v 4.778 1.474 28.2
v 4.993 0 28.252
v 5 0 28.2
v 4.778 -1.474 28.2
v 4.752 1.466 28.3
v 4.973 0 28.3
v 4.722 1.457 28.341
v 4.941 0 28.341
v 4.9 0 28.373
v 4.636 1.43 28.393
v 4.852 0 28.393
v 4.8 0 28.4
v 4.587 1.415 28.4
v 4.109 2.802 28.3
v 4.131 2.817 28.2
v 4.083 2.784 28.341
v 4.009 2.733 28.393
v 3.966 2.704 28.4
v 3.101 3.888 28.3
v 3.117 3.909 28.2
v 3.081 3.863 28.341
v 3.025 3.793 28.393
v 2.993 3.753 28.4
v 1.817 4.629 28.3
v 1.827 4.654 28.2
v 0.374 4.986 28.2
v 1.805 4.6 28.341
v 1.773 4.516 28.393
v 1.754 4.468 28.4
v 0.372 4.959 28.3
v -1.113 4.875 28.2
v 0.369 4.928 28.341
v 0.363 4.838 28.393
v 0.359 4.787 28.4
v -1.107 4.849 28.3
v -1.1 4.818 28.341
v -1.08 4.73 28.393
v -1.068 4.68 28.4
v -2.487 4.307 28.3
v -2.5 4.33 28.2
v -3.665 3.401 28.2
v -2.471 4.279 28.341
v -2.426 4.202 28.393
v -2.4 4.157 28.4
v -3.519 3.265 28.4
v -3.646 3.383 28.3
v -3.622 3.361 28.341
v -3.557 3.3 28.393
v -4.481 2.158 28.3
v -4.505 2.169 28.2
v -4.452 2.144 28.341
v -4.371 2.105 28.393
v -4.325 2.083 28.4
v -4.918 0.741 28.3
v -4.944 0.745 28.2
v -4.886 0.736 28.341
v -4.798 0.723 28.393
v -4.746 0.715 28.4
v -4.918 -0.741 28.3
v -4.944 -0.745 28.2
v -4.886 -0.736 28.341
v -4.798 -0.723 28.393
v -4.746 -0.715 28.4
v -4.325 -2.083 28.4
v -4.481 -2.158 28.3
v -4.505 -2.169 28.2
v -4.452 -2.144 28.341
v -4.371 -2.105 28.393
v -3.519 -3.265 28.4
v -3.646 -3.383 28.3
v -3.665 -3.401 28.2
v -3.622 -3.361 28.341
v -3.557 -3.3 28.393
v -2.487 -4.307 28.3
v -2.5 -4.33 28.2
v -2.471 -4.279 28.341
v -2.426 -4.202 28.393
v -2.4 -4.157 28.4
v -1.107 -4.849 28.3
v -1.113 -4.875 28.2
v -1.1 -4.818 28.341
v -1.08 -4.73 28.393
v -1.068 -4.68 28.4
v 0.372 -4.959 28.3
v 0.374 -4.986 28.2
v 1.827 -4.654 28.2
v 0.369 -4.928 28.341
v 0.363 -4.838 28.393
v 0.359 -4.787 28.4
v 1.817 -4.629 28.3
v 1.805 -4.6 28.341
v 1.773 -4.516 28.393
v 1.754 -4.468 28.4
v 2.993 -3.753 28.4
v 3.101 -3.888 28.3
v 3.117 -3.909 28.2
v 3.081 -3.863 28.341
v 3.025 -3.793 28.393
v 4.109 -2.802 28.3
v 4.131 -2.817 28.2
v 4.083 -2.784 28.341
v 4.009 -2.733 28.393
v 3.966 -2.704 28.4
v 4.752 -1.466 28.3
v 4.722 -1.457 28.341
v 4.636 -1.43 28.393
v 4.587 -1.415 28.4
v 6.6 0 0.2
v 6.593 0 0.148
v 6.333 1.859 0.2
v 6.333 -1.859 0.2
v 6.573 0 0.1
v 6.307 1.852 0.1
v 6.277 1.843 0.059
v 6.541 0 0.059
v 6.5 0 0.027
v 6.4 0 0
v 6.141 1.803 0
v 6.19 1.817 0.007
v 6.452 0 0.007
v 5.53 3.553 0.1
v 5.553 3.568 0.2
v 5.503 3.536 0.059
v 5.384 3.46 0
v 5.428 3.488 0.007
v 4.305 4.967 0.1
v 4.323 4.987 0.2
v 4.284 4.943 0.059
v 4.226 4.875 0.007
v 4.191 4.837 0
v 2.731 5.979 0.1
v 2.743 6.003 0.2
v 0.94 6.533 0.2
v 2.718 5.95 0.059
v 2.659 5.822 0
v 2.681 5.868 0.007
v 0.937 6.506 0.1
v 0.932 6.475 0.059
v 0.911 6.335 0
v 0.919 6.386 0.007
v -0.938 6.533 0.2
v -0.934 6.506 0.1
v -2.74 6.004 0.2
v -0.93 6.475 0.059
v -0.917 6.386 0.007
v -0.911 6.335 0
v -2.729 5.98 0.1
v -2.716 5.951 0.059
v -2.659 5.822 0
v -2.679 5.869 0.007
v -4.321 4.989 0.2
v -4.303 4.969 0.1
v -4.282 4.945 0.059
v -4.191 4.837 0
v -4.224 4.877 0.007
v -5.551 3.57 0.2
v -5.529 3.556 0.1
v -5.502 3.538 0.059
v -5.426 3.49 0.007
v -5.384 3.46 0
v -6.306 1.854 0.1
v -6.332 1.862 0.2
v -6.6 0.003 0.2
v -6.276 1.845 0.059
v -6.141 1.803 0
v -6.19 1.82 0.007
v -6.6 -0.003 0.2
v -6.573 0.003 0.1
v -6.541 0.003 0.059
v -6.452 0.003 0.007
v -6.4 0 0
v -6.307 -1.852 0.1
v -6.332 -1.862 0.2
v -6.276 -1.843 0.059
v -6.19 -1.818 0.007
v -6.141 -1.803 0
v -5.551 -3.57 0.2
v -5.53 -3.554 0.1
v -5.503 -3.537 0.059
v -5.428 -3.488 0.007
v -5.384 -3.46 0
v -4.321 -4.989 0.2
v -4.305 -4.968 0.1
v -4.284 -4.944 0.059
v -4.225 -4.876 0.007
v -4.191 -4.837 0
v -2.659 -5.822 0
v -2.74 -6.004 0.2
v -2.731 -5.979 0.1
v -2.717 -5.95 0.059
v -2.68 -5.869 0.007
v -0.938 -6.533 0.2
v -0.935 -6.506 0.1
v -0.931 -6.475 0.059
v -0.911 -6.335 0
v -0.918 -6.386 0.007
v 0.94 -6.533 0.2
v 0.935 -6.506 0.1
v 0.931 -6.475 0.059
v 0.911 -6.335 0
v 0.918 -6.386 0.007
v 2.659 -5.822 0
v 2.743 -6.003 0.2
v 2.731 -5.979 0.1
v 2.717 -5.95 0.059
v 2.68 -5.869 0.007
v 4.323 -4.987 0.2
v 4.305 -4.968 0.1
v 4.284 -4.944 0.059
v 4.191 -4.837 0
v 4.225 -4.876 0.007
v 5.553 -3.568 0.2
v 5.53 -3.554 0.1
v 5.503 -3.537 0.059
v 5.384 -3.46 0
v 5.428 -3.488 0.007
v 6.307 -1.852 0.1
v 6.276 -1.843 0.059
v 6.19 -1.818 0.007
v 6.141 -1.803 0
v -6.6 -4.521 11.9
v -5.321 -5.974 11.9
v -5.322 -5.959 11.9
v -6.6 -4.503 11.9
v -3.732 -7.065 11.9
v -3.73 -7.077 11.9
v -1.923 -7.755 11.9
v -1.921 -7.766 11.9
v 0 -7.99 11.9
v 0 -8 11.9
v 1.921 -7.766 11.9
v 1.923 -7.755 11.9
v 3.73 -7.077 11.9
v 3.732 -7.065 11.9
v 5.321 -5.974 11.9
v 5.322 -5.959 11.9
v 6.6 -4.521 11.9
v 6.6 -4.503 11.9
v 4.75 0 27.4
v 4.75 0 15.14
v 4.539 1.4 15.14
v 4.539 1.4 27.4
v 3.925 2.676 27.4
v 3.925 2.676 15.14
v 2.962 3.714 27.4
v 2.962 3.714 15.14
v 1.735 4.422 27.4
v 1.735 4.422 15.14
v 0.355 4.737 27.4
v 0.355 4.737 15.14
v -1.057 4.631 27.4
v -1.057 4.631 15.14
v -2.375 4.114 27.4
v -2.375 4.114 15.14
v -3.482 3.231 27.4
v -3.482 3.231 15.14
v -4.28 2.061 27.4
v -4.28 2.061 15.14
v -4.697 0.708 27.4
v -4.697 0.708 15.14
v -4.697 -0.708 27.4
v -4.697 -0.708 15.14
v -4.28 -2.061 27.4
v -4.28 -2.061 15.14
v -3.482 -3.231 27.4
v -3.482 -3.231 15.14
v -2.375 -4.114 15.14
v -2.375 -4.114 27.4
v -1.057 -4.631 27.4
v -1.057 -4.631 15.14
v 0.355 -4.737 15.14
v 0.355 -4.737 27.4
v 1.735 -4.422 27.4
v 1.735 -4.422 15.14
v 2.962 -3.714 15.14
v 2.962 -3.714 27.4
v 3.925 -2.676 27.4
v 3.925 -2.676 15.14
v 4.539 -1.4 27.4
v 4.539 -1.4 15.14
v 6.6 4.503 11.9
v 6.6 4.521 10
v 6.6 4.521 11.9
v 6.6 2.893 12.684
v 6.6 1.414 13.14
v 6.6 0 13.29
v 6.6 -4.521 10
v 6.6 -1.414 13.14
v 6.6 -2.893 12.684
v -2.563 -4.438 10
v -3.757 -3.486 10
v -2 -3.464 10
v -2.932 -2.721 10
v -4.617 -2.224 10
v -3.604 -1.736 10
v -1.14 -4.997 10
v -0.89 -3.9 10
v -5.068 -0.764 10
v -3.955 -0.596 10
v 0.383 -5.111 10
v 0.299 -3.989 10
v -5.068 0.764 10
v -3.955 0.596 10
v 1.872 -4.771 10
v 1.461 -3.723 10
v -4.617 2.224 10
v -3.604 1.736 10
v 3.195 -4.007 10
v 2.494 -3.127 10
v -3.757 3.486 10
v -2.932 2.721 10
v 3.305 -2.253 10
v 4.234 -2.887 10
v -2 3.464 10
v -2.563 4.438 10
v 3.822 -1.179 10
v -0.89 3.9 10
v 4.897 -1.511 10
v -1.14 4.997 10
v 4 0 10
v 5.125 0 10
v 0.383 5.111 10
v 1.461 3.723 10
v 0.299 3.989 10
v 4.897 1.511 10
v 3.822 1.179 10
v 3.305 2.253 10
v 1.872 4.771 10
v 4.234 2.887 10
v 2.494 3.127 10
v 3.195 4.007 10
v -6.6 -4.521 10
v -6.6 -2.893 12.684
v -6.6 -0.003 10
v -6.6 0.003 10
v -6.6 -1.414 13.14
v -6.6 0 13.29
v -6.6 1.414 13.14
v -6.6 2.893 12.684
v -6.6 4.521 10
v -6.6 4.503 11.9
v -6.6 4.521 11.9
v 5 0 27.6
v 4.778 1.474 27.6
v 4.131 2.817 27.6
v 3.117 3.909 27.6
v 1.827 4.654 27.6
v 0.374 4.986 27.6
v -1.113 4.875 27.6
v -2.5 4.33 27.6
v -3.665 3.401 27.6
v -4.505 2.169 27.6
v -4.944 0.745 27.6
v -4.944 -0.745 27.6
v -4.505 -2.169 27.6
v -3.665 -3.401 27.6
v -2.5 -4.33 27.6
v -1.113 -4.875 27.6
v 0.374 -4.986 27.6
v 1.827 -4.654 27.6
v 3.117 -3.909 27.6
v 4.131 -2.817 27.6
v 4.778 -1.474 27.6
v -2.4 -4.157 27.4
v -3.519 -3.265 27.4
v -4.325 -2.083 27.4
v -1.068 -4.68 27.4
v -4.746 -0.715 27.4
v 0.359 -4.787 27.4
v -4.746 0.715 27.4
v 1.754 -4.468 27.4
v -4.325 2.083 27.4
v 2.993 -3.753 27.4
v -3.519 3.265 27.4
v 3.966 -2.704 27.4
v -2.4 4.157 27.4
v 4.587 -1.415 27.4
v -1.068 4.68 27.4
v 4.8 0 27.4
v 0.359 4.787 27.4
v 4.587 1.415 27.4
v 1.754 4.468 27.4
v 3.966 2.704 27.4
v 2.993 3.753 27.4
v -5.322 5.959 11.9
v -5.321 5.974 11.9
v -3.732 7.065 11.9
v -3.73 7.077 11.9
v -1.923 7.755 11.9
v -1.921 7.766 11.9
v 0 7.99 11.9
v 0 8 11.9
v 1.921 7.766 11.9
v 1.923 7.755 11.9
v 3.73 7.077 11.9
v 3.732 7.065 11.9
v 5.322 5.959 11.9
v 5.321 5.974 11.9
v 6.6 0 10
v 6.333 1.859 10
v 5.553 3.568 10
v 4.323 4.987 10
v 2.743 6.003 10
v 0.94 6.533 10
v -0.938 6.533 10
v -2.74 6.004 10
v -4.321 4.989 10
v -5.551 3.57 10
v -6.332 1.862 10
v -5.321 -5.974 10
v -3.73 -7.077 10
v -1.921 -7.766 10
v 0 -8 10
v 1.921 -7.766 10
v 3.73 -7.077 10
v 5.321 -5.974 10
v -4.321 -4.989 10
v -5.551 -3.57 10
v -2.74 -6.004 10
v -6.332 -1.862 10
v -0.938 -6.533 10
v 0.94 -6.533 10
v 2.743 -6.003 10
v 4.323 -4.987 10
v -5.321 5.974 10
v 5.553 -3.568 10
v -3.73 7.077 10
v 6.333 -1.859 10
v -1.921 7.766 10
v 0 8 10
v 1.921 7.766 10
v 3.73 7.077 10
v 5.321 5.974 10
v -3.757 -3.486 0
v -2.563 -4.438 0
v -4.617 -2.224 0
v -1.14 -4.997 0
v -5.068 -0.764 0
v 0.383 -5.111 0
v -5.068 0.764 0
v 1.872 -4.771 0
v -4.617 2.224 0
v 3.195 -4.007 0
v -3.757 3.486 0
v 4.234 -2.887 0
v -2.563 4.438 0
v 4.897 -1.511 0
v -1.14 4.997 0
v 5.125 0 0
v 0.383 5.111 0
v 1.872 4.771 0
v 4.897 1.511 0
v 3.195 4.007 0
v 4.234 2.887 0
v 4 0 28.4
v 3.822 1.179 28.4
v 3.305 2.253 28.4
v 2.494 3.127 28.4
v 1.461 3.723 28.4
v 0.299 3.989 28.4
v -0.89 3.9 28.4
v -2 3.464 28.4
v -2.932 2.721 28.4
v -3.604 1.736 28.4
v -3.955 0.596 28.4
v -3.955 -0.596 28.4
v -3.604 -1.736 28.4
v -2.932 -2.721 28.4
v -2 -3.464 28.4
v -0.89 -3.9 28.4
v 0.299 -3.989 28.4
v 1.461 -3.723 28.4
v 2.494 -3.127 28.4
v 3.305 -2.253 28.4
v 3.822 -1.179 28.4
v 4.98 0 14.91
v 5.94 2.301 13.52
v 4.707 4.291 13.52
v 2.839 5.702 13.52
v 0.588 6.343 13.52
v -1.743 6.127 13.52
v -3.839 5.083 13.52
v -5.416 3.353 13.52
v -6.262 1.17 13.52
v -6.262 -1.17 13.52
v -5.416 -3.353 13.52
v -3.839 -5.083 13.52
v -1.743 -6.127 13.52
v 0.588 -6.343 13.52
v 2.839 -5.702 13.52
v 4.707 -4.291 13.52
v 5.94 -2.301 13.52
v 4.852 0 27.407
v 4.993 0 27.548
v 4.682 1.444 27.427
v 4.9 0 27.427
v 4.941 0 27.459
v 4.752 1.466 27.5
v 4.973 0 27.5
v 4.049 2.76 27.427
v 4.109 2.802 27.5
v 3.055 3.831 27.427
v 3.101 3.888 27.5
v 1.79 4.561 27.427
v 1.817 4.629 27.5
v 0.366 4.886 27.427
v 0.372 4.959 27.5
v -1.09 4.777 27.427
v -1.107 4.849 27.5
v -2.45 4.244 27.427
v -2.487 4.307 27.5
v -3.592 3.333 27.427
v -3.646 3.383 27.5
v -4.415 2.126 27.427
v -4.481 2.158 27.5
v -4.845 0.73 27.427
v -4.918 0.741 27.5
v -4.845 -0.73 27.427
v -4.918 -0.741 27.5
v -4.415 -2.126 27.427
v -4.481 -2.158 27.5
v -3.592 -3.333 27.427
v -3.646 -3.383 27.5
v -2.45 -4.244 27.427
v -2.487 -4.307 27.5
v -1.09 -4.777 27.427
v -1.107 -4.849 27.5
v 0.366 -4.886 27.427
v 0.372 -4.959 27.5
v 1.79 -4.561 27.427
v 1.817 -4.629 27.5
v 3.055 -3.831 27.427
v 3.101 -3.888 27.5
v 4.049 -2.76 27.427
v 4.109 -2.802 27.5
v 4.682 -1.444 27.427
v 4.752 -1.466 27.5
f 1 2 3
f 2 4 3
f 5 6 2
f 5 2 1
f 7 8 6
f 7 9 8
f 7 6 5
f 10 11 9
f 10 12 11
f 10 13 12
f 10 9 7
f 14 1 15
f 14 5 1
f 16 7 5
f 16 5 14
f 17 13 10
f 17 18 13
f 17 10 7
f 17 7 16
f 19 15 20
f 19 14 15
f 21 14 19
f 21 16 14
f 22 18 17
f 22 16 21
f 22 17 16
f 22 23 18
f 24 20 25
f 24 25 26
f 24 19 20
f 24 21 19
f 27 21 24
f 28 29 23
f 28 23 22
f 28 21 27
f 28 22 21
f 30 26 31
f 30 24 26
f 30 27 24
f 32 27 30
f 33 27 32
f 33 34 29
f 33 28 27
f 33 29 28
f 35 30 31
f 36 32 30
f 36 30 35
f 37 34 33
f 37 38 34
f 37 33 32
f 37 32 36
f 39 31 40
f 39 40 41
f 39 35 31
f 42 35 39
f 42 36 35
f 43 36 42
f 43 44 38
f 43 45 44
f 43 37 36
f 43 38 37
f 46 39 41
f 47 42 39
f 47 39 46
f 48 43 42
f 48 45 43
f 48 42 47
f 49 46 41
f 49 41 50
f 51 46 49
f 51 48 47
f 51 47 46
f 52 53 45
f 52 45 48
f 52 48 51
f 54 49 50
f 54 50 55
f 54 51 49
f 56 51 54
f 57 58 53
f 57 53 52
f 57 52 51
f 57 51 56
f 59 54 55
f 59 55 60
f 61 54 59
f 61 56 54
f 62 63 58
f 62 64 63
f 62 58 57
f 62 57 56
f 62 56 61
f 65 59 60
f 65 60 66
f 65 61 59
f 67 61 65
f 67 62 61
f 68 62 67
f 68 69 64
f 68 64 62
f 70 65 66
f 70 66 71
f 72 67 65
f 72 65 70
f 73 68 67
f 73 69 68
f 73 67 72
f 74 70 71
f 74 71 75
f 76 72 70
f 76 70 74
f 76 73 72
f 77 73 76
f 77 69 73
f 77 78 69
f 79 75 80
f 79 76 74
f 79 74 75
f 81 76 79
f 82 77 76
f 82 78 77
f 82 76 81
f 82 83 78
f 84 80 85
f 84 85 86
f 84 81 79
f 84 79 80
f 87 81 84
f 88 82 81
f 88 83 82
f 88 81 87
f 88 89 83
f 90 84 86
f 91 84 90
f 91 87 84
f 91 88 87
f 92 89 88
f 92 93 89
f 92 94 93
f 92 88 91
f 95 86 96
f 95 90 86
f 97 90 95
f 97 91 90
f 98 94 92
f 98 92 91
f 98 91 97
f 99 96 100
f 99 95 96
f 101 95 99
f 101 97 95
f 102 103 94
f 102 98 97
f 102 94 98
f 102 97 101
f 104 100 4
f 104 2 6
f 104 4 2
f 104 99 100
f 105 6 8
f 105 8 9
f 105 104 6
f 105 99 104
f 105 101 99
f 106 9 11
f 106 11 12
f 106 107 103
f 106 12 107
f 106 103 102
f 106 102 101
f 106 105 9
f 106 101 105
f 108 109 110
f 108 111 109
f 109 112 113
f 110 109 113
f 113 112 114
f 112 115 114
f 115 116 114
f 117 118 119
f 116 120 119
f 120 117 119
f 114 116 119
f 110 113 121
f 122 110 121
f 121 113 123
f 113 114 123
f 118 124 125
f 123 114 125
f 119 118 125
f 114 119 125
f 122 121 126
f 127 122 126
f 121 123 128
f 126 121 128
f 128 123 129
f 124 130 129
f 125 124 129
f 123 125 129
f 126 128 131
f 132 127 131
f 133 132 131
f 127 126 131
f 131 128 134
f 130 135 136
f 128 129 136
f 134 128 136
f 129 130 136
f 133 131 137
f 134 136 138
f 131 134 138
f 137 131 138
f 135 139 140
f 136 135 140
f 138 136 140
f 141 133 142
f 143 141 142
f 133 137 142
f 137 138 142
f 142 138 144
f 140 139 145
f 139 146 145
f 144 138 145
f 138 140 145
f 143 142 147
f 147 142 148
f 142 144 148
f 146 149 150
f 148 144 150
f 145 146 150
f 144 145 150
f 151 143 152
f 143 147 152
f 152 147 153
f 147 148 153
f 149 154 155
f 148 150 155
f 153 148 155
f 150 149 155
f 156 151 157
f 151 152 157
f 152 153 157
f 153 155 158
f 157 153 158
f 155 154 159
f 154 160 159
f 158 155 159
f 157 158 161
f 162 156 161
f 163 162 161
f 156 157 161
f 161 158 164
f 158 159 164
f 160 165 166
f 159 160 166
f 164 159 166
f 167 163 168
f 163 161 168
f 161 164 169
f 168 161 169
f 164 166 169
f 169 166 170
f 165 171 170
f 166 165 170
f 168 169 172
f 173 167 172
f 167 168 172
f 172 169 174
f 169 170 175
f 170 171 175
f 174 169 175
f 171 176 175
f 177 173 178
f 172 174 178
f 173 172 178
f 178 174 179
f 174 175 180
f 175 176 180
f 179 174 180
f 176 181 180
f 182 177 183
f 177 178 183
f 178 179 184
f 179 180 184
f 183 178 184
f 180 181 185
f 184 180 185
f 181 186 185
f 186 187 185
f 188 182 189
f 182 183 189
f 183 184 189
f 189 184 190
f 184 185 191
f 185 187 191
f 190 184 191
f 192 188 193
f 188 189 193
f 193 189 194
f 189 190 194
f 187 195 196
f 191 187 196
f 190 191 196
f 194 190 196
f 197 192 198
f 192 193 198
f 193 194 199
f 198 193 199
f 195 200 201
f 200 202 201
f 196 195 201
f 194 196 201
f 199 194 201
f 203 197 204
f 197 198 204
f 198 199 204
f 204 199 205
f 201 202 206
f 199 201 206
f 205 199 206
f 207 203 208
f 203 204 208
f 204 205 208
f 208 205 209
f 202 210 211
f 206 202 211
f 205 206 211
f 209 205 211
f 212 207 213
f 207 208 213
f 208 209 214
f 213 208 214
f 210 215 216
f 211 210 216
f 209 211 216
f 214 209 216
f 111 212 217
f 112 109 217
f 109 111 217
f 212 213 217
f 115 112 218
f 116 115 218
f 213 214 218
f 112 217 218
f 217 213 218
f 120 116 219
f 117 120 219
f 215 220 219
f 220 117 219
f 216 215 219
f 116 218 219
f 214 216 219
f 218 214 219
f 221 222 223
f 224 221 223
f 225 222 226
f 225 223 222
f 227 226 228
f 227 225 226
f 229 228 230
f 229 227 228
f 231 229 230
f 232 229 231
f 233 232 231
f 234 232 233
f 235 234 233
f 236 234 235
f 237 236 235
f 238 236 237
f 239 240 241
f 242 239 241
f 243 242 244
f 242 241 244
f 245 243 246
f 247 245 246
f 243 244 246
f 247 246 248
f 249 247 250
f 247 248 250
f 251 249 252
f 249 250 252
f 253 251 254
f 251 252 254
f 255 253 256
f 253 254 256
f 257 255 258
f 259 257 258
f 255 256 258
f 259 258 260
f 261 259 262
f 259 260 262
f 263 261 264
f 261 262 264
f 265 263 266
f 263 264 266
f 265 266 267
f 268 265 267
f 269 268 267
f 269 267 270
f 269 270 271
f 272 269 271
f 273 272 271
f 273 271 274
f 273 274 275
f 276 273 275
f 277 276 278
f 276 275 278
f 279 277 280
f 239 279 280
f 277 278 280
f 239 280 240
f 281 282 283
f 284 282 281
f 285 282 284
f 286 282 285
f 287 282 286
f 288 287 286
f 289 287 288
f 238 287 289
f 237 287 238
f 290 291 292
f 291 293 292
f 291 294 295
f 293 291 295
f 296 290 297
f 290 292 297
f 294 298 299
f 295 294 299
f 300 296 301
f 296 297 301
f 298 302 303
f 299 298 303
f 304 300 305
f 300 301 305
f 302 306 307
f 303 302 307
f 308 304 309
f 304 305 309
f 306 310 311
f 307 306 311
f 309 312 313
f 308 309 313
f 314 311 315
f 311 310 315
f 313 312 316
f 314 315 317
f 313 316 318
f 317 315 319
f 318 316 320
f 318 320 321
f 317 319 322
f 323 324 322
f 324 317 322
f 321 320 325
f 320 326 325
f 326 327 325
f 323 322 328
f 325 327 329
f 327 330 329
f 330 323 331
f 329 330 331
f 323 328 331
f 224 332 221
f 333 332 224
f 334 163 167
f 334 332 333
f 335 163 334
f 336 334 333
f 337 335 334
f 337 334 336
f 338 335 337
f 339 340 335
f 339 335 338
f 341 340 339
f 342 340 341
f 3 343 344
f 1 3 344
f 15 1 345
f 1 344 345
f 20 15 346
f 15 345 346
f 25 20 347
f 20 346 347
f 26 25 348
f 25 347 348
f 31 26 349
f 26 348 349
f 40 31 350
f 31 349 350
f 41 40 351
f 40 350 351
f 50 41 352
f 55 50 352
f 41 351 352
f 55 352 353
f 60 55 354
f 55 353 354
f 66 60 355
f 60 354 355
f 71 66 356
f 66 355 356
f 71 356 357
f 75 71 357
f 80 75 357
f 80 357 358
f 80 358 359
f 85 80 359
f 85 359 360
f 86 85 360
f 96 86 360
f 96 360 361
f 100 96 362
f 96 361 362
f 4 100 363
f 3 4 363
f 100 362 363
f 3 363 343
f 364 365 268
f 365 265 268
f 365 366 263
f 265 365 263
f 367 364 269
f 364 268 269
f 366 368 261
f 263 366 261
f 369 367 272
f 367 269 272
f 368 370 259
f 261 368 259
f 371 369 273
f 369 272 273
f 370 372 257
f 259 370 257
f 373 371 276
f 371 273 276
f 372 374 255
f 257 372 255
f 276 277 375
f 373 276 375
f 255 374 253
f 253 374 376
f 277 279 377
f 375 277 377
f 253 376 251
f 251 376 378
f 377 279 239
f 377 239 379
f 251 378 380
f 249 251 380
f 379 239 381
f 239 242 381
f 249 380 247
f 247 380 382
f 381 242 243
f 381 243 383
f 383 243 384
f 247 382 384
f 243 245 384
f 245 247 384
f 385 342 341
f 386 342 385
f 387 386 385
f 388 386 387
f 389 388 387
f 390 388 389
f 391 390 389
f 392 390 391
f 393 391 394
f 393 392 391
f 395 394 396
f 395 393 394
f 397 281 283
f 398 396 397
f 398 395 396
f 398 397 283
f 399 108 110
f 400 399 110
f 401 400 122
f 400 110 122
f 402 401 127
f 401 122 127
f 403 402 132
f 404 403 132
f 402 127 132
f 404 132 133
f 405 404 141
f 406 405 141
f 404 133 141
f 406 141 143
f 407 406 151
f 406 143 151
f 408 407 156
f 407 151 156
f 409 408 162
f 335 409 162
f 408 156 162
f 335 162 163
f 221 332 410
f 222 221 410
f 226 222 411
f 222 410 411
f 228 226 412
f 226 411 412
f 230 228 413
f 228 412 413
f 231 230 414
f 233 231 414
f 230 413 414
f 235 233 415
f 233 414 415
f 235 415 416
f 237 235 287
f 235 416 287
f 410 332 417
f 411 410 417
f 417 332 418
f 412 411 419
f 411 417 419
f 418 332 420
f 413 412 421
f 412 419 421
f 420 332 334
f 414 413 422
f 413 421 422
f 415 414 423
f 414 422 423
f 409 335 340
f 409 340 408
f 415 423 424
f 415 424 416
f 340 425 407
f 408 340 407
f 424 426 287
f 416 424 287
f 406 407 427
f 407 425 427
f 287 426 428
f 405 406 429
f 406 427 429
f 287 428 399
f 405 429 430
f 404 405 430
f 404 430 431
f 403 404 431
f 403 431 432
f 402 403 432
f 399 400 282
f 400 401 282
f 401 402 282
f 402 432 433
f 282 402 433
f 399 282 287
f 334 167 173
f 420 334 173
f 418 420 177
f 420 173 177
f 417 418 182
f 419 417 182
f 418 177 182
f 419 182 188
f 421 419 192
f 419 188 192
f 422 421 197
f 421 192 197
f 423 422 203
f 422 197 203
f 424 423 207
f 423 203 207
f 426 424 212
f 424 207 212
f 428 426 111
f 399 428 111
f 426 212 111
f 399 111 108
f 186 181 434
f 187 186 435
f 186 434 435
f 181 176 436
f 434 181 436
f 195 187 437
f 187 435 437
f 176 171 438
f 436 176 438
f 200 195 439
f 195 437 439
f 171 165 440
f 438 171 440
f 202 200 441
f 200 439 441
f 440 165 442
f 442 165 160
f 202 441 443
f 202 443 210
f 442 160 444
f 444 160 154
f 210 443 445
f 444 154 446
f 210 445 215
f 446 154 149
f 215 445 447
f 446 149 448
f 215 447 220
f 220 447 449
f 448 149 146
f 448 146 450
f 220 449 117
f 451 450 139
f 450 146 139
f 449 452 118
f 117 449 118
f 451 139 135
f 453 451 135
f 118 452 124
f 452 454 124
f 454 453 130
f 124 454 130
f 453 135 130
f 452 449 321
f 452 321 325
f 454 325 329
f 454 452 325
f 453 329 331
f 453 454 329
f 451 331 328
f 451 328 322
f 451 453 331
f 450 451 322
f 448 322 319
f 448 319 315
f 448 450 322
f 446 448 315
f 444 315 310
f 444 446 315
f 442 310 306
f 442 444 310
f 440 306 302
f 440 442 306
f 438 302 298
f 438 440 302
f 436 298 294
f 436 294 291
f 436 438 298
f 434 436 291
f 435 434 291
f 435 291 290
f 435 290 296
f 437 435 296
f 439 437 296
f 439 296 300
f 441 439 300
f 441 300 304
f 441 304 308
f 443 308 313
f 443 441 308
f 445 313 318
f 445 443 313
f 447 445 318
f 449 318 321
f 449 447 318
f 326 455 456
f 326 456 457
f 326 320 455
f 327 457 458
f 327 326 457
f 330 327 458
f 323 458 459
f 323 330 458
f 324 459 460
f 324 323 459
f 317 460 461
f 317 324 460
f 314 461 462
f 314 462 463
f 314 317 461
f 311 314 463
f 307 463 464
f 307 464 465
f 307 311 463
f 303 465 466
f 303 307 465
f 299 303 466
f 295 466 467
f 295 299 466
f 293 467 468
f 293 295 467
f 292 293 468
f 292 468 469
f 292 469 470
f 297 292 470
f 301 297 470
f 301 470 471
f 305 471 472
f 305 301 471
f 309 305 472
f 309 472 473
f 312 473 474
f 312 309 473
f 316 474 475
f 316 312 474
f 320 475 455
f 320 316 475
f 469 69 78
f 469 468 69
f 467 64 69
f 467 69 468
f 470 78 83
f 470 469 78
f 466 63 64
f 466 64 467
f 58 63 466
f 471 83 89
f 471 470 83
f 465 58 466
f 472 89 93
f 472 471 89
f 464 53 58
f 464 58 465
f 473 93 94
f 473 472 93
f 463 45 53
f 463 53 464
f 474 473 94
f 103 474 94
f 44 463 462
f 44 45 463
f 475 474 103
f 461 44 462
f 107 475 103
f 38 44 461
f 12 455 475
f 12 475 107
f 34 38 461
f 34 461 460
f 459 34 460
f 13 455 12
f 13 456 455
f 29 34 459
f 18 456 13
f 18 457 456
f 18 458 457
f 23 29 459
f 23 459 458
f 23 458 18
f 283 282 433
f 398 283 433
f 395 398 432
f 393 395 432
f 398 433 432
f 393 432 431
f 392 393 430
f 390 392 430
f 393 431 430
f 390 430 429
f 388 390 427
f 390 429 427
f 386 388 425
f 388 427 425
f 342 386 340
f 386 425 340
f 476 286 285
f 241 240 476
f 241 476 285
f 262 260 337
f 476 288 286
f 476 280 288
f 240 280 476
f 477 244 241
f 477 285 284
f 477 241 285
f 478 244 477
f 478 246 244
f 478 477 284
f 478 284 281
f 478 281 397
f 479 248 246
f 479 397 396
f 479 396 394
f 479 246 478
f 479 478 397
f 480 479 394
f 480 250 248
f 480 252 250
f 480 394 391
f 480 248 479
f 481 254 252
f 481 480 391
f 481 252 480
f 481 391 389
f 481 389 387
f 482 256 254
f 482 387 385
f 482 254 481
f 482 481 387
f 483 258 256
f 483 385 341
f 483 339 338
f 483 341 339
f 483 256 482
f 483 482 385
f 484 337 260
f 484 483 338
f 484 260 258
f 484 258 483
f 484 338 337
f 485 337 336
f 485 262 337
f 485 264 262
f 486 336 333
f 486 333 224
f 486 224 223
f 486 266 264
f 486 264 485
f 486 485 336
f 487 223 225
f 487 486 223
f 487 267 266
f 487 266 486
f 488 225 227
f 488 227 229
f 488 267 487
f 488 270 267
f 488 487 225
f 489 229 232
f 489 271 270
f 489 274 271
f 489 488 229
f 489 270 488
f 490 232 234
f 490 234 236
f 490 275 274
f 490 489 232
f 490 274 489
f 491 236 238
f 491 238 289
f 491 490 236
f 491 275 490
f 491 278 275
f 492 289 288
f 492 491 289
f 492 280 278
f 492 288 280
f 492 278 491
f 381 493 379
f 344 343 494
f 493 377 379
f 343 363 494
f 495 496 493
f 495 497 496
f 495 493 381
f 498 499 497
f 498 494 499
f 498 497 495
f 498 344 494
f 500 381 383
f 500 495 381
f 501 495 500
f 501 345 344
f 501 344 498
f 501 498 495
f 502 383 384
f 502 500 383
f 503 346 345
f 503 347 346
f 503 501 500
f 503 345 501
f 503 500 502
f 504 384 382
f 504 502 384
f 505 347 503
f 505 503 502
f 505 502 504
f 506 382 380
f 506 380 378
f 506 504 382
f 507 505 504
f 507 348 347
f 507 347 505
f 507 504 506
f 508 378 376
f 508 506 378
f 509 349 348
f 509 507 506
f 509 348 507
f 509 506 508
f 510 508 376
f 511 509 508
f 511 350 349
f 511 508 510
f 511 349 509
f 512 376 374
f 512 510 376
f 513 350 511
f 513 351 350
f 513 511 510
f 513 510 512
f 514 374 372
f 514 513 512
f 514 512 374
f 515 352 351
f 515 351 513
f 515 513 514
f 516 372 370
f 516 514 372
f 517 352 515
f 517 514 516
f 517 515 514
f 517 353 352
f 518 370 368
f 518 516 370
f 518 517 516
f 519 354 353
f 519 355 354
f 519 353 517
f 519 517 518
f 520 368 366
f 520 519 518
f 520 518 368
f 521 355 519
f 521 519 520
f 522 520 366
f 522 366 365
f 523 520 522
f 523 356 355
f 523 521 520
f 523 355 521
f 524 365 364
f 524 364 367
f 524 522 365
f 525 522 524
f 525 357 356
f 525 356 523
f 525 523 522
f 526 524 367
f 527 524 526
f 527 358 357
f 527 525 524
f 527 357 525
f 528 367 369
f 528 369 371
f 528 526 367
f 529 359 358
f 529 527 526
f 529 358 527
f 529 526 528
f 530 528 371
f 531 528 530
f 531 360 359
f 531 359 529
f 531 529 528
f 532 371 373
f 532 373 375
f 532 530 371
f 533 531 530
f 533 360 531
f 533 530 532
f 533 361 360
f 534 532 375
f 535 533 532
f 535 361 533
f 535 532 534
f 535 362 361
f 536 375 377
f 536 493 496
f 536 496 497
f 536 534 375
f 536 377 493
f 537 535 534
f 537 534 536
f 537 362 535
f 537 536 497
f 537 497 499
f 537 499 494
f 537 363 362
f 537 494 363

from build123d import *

# Parameters (mm, degrees)
SKETCH061_R          = 6.6
SKETCH061_R_2        = 5.125
PAD009_DEPTH         = 10
SKETCH062_R          = 8
SKETCH062_R_2        = 4
PAD010_DEPTH         = 1.9
SKETCH063_R          = 4.75
SKETCH063_R_2        = 4
PAD011_DEPTH         = 15.5
SKETCH064_R          = 5
SKETCH064_R_2        = 4
PAD012_DEPTH         = 1
CHAMFER_SIZE         = 3.24
FILLET002_R          = 0.2
SKETCH065_W          = 11.246889
SKETCH065_H          = 18.579264
SKETCH065_W_2        = 10.317355
SKETCH065_H_2        = 19.434534
POCKET012_DEPTH      = 100
POCKET012_DEPTH_BACK = 100


with BuildPart() as part:
    # Sketch061 → Pad009 (new body)
    with BuildSketch(Plane.XY):
        Circle(SKETCH061_R)
        Circle(SKETCH061_R_2, mode=Mode.SUBTRACT)
    extrude(amount=PAD009_DEPTH)

    # Sketch062 (on Face4 of Pad009) → Pad010 (join)
    with BuildSketch(Plane.XY.offset(10)):
        Circle(SKETCH062_R)
        Circle(SKETCH062_R_2, mode=Mode.SUBTRACT)
    extrude(amount=PAD010_DEPTH)

    # Sketch063 (on Face7 of Pad010) → Pad011 (join)
    with BuildSketch(Plane.XY.offset(11.9)):
        Circle(SKETCH063_R)
        Circle(SKETCH063_R_2, mode=Mode.SUBTRACT)
    extrude(amount=PAD011_DEPTH)

    # Sketch064 (on Face11 of Pad011) → Pad012 (join)
    with BuildSketch(Plane.XY.offset(27.4)):
        Circle(SKETCH064_R)
        Circle(SKETCH064_R_2, mode=Mode.SUBTRACT)
    extrude(amount=PAD012_DEPTH)

    # Chamfer
    chamfer_edges = [part.edges().sort_by_distance(p)[0] for p in [
        (-4.75, 0, 11.9),
    ]]
    chamfer(chamfer_edges, length=CHAMFER_SIZE)

    # Fillet002
    fillet002_edges = [part.edges().sort_by_distance(p)[0] for p in [
        (-5, 0, 28.4),
        (-5, 0, 27.4),
        (-6.6, 0, 0),
    ]]
    fillet(fillet002_edges, radius=FILLET002_R)

    # Sketch065 → Pocket012 (cut, two sides)
    with BuildSketch(Plane.XZ) as pocket012_sk:
        with Locations((-12.223444, 9.289632)):
            Rectangle(SKETCH065_W, SKETCH065_H)
        with Locations((11.758678, 9.717267)):
            Rectangle(SKETCH065_W_2, SKETCH065_H_2)
    extrude(amount=-POCKET012_DEPTH, mode=Mode.SUBTRACT)
    extrude(pocket012_sk.sketch, amount=POCKET012_DEPTH_BACK, mode=Mode.SUBTRACT)


solid = part.part
